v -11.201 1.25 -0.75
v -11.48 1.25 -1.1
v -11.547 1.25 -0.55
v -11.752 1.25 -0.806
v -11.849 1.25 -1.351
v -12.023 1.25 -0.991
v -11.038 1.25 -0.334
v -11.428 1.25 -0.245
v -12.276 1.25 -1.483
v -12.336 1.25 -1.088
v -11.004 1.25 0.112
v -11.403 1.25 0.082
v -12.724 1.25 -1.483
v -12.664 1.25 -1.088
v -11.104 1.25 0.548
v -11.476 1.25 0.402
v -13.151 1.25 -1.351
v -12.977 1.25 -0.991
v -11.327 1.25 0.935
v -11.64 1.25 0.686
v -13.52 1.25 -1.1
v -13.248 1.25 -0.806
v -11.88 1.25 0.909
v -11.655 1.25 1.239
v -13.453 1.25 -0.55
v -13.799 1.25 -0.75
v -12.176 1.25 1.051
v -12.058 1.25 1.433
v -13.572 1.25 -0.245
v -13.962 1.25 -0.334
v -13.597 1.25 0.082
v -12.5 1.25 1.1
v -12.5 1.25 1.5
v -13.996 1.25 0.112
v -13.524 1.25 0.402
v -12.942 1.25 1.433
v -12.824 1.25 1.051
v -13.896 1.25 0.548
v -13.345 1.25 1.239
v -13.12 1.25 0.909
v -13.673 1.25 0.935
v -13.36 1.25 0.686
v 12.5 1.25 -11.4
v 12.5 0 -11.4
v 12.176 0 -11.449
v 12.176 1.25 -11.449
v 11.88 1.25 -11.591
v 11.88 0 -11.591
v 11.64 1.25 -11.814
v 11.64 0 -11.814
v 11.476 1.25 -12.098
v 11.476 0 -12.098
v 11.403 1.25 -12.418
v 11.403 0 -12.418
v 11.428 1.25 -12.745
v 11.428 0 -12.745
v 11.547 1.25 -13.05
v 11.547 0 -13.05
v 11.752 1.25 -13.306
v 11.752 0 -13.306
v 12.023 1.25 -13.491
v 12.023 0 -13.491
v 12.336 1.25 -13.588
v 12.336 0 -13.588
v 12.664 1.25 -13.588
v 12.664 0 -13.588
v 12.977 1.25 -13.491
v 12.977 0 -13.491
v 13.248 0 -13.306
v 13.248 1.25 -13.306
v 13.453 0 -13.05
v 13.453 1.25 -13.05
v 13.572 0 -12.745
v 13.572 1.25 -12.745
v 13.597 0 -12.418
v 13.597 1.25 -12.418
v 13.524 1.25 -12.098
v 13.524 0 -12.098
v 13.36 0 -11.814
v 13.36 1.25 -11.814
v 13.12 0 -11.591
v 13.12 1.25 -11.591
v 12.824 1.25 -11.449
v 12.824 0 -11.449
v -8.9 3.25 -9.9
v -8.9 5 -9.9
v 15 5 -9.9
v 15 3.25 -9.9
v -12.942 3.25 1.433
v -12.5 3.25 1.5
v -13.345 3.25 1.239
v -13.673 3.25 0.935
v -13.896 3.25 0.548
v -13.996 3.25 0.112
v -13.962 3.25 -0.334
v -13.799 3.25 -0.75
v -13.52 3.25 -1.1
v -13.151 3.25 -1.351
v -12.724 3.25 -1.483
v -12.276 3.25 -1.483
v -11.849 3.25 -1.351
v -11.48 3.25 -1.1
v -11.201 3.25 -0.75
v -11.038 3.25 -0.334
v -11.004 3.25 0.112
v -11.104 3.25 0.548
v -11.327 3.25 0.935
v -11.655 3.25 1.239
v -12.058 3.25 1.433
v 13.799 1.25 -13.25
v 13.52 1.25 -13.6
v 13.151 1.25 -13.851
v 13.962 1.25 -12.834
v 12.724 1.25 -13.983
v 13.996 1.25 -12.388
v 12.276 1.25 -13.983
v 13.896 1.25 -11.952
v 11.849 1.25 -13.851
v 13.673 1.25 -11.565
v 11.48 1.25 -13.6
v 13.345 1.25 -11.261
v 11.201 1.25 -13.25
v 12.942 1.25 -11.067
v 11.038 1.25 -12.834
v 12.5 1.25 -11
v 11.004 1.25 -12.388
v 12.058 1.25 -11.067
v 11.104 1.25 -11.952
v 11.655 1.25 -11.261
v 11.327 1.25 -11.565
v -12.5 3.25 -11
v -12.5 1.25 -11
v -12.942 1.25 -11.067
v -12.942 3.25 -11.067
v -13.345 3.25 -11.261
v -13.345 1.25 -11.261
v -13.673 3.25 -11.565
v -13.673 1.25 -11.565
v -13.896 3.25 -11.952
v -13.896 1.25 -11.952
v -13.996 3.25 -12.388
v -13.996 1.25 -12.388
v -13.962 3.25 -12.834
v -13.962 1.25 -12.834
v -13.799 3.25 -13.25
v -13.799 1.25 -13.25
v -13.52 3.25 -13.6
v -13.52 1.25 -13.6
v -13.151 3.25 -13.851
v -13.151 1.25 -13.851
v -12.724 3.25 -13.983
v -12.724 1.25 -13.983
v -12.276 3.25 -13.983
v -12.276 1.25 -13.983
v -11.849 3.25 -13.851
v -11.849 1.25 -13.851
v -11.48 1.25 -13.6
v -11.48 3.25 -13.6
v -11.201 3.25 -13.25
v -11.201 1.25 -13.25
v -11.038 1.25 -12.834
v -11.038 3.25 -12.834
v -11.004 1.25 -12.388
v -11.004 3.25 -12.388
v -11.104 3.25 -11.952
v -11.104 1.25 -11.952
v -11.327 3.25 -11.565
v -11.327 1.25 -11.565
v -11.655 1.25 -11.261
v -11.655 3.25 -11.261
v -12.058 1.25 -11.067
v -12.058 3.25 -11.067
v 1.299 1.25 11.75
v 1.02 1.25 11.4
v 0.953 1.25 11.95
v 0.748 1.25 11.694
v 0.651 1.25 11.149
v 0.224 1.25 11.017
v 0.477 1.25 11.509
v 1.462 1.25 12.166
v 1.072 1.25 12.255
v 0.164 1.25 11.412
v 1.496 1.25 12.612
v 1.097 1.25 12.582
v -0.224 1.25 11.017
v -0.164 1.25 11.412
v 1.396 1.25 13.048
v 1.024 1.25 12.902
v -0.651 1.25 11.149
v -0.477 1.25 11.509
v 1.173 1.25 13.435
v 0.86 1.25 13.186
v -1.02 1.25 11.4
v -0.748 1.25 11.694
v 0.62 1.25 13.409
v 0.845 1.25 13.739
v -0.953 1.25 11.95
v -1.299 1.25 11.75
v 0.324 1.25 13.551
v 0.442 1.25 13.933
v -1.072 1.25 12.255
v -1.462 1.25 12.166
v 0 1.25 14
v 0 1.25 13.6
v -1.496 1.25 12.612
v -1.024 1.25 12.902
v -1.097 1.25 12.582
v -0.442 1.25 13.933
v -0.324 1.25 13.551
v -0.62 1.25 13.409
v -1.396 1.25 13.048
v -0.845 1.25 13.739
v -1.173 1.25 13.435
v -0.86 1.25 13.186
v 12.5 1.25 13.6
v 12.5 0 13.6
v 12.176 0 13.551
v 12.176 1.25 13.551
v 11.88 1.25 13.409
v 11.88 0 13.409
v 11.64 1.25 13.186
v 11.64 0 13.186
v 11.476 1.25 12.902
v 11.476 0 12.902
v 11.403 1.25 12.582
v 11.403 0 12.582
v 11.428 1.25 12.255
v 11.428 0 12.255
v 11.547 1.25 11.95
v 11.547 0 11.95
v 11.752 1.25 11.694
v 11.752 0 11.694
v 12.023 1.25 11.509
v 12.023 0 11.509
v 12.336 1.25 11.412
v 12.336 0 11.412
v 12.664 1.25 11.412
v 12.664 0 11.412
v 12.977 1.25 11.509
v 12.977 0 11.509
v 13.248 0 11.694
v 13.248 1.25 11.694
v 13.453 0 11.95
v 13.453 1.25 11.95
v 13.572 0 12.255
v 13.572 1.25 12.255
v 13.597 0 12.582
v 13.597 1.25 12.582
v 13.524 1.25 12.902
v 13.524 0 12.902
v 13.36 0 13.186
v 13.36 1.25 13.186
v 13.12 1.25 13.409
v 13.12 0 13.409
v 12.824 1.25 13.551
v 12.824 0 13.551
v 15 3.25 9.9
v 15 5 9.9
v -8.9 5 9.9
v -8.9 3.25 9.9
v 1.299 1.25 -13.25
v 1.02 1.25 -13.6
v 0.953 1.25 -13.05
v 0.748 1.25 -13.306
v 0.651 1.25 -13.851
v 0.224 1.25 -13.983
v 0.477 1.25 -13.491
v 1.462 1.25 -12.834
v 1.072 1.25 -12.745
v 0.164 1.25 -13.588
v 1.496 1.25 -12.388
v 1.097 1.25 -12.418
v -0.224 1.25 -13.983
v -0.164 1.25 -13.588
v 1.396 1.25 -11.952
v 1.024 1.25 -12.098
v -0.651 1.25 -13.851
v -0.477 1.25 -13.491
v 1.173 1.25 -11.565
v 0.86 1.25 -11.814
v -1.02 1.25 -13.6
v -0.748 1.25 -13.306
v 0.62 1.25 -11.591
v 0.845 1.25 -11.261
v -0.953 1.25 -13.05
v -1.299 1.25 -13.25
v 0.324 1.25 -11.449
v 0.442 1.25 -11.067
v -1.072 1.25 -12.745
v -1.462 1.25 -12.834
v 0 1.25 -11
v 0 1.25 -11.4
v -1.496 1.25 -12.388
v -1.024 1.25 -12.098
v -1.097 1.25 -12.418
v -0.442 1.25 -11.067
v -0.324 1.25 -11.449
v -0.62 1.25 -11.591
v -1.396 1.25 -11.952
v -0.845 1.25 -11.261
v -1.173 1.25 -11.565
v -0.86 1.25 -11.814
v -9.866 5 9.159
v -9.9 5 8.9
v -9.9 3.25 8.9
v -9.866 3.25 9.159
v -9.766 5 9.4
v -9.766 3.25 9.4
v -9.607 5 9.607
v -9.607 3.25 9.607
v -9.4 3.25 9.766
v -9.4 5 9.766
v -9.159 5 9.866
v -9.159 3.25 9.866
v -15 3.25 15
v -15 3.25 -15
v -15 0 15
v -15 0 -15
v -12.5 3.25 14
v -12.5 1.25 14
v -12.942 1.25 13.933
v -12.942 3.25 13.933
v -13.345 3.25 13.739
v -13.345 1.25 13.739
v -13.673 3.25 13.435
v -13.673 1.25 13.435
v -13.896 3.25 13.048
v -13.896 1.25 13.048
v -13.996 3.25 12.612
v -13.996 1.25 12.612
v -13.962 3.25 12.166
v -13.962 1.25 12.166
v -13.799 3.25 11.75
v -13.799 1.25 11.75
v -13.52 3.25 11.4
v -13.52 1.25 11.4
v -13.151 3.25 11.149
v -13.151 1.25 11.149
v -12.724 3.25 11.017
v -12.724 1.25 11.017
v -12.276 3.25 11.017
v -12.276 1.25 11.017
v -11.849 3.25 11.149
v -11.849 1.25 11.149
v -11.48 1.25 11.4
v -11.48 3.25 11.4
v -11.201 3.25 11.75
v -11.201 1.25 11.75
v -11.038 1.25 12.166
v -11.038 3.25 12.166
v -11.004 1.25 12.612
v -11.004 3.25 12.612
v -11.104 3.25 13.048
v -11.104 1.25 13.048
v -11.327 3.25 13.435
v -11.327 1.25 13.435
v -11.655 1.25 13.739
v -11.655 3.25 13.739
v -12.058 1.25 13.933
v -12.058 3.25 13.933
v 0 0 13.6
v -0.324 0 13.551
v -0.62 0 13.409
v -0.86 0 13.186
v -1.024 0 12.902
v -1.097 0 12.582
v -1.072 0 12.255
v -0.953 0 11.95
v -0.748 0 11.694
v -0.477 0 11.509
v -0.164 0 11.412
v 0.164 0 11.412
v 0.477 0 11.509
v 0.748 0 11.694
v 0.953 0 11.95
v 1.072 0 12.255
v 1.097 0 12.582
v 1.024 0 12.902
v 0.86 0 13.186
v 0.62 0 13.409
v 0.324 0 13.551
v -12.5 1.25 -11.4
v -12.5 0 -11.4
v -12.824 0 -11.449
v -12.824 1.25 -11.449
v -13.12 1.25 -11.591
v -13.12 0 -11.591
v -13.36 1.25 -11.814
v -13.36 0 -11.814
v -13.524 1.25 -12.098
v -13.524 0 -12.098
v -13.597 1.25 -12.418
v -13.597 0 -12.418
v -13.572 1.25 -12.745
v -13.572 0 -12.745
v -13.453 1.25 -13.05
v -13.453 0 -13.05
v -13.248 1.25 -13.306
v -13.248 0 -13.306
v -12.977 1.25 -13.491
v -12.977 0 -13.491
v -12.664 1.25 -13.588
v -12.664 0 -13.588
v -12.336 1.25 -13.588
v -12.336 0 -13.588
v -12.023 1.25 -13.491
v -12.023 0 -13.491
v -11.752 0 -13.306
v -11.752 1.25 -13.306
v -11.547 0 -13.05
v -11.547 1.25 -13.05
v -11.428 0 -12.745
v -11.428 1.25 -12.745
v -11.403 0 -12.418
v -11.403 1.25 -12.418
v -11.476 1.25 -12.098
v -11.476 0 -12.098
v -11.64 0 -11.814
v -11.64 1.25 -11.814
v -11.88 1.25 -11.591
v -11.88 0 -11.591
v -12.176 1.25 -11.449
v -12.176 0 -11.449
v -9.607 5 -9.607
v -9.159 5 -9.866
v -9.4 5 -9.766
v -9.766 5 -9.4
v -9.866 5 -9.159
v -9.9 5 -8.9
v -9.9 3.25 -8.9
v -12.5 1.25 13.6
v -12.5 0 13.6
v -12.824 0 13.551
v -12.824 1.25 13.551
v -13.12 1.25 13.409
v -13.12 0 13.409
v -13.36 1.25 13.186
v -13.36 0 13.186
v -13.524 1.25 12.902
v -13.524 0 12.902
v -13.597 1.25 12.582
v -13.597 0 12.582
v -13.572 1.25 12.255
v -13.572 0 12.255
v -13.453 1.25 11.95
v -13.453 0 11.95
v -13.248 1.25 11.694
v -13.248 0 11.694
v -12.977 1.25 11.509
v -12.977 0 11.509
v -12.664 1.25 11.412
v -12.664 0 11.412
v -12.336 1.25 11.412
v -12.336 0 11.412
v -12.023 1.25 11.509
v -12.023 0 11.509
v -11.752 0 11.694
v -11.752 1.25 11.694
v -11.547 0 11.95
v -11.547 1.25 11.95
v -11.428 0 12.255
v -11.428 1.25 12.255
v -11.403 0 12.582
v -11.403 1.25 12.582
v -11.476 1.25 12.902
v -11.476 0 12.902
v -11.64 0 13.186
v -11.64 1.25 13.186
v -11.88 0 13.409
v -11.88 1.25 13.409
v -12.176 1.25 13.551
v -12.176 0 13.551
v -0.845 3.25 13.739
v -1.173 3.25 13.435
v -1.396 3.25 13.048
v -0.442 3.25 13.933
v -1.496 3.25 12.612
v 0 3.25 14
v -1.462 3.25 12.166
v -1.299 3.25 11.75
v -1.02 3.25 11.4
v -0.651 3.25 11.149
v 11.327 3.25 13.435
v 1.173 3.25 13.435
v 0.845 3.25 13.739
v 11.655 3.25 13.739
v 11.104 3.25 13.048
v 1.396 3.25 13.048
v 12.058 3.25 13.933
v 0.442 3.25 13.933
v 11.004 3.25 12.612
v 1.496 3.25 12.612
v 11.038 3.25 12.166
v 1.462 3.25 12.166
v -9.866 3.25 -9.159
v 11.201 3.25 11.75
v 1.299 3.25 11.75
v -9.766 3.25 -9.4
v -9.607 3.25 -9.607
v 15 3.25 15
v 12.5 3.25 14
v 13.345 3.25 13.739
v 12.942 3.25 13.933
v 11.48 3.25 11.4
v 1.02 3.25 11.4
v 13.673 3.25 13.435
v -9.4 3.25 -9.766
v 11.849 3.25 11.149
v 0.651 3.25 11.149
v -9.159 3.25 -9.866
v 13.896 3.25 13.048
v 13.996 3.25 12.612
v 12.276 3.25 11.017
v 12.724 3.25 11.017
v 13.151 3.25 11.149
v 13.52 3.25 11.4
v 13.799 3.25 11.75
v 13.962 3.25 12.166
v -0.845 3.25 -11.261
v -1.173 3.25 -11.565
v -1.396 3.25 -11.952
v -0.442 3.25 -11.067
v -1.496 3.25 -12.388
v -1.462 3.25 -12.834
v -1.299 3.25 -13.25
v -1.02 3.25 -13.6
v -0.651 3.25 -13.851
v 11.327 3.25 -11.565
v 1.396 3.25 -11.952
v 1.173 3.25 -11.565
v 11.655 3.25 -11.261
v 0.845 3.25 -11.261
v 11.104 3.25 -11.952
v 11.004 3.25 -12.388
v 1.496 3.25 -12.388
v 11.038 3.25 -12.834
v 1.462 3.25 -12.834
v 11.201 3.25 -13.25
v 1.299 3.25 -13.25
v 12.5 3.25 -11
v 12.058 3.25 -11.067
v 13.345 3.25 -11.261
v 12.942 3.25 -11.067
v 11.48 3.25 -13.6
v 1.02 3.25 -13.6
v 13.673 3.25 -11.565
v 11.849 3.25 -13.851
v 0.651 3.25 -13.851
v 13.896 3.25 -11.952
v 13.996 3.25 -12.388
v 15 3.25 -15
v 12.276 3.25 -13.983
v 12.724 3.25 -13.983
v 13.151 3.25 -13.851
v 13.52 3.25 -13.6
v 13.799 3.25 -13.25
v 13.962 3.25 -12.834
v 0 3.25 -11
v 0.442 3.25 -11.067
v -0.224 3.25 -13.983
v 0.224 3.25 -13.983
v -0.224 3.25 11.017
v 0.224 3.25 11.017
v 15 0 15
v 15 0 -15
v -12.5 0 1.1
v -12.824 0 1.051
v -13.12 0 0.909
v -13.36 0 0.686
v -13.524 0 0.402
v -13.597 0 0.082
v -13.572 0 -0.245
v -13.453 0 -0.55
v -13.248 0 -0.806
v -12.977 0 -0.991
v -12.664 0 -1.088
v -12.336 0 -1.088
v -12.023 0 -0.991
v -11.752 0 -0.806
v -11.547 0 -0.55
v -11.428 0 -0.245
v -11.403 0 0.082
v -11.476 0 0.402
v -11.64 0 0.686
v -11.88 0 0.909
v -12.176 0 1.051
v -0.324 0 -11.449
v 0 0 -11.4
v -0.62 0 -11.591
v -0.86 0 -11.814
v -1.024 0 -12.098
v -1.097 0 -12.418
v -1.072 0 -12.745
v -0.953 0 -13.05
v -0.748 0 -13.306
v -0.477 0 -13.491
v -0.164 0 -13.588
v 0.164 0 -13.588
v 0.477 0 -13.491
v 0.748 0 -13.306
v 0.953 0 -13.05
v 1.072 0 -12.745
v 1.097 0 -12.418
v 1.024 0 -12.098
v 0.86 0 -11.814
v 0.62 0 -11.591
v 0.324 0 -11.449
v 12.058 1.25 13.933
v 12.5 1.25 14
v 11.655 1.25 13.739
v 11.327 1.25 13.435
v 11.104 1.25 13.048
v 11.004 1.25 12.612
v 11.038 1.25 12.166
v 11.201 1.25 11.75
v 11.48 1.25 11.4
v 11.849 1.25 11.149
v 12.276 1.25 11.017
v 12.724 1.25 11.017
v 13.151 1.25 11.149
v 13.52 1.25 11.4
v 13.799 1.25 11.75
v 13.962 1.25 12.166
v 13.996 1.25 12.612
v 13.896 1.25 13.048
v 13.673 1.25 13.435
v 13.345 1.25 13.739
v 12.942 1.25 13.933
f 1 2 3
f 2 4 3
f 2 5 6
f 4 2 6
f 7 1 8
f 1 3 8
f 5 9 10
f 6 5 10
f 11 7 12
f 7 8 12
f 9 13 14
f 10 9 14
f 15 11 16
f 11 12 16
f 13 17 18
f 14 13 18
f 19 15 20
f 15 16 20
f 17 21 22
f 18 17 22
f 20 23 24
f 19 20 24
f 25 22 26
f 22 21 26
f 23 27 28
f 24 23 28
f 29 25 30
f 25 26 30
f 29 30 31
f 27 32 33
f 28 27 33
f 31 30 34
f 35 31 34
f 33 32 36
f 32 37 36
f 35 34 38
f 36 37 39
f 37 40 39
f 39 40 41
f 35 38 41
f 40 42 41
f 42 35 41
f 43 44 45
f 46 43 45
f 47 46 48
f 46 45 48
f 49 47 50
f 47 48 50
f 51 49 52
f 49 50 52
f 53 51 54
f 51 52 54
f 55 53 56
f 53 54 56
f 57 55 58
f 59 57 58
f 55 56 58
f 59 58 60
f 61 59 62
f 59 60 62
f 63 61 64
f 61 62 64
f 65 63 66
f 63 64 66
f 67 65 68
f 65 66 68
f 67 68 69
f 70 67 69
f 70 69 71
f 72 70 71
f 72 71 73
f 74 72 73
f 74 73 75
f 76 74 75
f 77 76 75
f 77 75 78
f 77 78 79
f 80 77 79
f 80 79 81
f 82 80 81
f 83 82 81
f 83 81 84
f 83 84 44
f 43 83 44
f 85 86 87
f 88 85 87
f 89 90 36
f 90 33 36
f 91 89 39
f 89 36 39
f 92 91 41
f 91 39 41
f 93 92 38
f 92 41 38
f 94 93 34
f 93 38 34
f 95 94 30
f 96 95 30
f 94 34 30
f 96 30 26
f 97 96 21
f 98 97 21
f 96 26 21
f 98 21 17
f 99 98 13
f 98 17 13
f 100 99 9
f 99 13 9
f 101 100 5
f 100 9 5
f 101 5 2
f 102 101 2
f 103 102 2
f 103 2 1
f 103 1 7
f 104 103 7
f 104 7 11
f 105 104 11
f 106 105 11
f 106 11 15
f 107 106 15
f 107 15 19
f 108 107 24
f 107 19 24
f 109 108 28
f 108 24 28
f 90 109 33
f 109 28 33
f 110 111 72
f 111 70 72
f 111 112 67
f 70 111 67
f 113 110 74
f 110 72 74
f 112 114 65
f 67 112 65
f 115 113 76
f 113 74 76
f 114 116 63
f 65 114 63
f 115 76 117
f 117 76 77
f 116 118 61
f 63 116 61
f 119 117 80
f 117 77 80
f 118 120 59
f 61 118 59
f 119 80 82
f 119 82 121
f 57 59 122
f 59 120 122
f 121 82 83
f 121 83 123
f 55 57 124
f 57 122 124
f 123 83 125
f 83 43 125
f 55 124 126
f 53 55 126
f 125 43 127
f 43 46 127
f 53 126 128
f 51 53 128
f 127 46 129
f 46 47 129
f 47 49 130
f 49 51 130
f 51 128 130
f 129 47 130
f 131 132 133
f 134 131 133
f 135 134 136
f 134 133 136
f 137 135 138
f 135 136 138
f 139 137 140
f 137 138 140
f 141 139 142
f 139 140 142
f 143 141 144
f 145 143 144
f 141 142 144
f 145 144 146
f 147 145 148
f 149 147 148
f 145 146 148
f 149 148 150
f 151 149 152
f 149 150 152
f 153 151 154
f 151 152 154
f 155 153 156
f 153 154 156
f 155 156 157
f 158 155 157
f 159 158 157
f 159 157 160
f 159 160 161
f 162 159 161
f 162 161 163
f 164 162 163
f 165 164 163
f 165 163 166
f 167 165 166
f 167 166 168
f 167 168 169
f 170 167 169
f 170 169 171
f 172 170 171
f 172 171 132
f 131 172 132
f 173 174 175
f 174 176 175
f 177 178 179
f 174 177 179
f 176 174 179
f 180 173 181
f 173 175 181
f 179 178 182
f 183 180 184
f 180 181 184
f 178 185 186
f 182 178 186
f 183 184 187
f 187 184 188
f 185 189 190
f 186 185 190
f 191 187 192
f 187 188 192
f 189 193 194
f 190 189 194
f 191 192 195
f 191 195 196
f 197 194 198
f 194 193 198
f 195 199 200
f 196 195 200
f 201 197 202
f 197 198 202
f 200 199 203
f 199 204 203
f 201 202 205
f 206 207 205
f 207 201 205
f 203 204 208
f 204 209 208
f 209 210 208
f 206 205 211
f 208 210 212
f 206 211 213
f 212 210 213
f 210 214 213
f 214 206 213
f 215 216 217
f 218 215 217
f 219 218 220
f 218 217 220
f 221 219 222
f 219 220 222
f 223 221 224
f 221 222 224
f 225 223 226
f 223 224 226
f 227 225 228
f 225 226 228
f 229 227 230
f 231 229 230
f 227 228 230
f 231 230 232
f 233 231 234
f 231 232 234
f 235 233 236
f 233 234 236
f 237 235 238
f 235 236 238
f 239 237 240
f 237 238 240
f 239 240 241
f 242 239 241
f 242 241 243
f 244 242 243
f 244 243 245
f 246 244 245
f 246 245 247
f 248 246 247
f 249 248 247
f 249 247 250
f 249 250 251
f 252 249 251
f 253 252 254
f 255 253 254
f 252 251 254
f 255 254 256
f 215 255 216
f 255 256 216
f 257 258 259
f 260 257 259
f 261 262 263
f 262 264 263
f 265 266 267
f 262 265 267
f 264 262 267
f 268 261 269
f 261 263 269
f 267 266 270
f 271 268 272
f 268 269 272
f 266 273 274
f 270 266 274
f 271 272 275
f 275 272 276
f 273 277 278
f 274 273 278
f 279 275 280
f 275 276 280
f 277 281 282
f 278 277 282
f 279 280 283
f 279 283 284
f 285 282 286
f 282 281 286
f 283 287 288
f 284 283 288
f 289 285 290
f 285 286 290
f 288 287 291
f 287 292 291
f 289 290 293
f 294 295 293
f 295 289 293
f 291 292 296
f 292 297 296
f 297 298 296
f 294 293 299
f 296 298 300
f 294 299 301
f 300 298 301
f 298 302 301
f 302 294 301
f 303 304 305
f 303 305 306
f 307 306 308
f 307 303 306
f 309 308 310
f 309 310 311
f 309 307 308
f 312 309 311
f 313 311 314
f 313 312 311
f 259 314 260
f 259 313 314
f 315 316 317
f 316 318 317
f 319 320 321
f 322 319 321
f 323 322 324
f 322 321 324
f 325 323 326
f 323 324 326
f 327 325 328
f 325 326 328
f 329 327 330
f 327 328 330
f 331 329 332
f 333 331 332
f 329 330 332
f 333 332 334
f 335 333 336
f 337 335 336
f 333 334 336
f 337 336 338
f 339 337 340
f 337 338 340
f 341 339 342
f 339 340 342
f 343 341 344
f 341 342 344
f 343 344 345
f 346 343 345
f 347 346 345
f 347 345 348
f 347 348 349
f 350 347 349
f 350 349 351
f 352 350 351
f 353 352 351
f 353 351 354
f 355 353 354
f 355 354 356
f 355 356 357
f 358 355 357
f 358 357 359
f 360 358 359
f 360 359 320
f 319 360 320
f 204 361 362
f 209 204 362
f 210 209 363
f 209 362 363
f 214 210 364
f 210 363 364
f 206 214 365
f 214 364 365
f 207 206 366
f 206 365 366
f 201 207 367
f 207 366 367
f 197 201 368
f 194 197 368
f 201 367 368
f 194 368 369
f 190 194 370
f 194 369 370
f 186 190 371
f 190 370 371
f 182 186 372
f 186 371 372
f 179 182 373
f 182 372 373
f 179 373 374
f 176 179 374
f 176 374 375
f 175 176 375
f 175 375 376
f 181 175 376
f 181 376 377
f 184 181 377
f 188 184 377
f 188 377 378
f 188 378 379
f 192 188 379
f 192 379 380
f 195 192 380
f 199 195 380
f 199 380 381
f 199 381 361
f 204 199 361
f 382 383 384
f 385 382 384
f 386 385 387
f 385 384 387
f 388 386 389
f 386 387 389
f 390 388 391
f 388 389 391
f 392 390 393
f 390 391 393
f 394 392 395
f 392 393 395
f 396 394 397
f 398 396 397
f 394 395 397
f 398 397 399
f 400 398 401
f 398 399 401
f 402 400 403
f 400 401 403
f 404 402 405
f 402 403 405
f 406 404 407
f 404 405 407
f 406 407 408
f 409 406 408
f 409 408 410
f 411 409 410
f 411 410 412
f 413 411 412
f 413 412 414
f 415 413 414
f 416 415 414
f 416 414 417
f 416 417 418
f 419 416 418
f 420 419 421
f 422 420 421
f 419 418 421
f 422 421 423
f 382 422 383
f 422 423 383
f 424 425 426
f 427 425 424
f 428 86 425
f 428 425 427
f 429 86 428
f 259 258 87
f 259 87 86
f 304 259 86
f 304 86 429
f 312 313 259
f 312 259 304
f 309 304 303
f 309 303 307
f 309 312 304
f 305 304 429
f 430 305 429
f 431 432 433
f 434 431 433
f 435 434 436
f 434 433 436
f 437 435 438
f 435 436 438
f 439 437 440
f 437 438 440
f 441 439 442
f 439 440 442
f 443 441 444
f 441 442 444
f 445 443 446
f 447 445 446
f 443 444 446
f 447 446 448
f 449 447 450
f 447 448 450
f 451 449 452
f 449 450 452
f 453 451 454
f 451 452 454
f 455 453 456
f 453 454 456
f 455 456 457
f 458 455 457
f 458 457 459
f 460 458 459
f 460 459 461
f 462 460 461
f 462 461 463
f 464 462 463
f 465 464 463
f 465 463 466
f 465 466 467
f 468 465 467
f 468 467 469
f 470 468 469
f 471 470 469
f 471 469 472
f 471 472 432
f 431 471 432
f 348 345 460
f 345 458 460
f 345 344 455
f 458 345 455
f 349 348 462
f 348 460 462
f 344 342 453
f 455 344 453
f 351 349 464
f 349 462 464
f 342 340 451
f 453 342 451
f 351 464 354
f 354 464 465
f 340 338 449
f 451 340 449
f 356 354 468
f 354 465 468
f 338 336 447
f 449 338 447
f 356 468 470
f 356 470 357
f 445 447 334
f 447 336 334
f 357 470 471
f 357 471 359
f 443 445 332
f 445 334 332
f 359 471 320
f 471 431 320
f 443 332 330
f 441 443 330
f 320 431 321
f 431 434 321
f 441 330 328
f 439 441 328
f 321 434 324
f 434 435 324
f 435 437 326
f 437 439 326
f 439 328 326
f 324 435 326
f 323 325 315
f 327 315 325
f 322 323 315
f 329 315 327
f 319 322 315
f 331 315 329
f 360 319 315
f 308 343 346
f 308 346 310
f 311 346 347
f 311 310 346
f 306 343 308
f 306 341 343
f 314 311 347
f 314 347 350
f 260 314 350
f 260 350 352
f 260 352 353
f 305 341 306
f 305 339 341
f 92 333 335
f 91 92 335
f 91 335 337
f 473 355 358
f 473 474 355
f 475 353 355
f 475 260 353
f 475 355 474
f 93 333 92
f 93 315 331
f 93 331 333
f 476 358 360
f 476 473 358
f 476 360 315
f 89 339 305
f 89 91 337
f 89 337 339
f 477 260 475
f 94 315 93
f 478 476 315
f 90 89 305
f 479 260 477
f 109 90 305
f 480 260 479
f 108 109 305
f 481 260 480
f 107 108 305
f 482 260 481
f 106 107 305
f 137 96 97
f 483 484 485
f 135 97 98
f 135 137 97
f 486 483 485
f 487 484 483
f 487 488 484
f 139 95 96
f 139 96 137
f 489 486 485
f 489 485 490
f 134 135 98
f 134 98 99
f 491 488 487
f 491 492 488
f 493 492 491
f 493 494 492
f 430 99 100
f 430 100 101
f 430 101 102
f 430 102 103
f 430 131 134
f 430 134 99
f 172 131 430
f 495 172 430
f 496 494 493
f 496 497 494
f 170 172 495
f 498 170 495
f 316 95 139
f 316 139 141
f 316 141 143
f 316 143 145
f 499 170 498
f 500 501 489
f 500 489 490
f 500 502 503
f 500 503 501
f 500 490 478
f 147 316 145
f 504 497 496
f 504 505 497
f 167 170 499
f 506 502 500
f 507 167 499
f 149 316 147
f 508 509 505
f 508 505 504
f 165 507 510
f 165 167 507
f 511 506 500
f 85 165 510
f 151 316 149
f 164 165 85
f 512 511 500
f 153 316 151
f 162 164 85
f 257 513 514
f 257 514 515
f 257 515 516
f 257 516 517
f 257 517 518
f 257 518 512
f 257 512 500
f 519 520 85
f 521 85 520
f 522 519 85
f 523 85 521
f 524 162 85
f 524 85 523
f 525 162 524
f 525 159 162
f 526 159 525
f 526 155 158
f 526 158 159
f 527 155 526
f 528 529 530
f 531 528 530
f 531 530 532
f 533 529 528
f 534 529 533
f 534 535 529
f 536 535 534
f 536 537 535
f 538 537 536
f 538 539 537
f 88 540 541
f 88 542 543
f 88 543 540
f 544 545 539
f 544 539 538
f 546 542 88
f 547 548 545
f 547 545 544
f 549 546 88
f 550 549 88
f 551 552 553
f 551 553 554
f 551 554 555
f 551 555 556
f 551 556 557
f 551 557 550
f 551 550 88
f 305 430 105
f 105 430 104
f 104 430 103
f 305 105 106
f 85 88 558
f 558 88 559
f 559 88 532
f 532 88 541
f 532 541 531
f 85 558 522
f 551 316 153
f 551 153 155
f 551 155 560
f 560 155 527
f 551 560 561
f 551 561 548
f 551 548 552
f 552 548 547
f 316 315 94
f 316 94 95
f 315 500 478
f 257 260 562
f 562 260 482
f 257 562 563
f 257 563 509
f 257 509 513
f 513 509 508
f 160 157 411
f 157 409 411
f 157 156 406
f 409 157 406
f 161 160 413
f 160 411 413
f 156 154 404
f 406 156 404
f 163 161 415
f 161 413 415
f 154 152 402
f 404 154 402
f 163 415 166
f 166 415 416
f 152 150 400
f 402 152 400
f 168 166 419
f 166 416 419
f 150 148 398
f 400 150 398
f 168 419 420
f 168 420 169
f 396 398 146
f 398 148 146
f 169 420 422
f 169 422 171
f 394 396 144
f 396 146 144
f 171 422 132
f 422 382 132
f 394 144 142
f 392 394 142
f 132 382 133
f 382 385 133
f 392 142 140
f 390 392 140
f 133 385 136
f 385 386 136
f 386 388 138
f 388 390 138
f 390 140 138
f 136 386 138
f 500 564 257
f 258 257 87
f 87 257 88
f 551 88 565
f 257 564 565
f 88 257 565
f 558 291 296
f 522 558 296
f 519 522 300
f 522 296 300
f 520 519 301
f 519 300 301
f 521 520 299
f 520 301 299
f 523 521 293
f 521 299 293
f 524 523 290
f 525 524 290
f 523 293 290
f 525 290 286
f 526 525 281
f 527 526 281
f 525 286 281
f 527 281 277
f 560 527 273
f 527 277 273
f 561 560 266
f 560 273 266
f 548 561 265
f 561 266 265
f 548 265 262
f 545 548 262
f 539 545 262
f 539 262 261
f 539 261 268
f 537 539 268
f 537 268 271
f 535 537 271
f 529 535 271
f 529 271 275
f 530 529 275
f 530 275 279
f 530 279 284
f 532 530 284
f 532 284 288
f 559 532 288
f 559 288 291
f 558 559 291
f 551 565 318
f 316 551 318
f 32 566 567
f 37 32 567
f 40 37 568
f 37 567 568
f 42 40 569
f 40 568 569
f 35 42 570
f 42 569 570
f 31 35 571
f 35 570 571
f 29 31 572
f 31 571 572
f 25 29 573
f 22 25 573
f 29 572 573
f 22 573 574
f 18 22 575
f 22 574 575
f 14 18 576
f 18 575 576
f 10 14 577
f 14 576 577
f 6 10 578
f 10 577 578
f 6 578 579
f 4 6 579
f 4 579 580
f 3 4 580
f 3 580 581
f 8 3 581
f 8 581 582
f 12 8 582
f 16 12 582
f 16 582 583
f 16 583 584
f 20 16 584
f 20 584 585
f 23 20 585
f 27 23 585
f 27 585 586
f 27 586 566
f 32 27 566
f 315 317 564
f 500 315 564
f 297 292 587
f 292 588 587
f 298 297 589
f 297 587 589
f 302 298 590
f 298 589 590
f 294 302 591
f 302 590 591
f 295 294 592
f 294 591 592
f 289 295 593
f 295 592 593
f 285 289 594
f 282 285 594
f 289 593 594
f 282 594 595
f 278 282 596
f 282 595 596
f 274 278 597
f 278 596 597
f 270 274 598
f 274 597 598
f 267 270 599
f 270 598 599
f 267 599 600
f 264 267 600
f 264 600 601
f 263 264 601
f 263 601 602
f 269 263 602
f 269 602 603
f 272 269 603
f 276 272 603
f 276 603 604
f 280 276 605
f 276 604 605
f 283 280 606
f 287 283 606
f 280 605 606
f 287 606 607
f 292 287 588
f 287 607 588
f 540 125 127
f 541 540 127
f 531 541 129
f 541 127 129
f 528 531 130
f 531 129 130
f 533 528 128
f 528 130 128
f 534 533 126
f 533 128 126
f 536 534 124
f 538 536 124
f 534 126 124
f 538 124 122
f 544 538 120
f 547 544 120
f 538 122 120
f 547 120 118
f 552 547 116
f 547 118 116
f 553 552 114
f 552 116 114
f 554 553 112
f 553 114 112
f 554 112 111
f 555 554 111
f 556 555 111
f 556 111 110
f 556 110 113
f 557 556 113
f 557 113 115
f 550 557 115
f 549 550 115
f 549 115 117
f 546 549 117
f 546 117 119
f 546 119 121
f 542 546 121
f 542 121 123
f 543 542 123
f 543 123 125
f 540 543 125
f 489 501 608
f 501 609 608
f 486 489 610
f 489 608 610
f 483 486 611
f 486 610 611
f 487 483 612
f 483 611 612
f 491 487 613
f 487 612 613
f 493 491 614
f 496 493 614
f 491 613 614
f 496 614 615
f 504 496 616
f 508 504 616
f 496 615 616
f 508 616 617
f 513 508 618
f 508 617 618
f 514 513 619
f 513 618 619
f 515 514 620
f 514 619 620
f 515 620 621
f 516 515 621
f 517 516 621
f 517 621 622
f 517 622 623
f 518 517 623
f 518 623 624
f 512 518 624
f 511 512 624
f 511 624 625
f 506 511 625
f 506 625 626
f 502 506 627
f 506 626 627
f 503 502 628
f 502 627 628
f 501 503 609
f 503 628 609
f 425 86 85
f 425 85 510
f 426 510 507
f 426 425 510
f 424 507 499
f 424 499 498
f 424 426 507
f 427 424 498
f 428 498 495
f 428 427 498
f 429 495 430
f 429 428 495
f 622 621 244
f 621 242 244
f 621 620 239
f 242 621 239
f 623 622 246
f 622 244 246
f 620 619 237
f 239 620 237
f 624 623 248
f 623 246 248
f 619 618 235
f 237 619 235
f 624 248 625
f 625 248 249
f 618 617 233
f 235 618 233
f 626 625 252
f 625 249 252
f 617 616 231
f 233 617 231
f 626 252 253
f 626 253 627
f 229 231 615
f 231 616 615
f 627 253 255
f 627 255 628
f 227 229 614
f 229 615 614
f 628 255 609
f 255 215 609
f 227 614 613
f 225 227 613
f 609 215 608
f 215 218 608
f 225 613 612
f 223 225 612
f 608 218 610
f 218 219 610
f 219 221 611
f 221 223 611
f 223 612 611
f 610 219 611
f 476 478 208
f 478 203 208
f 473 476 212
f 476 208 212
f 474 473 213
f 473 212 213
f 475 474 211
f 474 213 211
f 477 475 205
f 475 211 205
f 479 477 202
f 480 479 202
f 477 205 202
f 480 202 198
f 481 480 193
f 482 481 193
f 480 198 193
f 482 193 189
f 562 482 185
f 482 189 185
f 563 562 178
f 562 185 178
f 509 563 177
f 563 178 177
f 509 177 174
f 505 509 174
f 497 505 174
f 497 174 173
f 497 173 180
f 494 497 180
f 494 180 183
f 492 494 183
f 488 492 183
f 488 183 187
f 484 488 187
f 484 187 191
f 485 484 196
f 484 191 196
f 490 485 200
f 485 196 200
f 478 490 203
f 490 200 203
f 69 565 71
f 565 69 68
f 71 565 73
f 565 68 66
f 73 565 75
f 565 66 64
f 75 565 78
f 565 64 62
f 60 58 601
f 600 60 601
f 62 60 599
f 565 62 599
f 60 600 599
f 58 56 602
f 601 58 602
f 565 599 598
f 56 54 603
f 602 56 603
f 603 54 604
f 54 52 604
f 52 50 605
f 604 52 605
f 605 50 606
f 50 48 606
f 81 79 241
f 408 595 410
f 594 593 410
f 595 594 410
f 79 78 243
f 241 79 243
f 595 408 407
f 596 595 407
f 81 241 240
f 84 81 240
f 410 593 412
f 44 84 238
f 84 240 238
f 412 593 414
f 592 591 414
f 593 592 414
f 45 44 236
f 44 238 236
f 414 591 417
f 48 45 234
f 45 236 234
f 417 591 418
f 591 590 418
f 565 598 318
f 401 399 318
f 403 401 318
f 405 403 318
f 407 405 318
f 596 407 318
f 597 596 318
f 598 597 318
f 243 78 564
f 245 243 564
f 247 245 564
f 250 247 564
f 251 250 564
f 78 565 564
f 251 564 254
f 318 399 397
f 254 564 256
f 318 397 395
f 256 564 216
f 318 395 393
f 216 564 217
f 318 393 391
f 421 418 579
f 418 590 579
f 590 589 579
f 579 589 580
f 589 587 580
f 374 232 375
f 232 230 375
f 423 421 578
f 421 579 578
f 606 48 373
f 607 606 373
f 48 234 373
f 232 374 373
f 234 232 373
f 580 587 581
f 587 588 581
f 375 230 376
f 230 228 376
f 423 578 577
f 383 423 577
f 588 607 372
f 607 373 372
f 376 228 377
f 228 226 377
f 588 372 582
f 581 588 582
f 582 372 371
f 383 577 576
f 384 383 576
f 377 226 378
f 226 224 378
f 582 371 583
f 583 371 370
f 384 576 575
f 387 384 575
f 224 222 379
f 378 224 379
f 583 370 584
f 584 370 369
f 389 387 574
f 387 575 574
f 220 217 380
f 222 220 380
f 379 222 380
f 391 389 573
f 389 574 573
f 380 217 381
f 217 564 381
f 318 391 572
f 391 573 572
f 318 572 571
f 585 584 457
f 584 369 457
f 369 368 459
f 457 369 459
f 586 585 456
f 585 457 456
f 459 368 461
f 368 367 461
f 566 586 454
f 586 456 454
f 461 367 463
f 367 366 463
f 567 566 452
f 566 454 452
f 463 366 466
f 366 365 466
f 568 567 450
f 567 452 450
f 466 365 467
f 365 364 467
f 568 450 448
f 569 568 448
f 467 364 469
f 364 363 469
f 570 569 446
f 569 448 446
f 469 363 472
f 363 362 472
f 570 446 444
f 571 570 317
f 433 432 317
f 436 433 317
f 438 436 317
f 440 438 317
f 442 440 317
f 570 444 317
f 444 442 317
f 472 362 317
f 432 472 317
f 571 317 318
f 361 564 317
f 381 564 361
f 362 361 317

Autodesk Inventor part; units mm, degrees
ref_plane "YZ Plane" through (0, 0, 0) normal (1, 0, 0) x (0, 1, 0)
ref_plane "XZ Plane" through (0, 0, 0) normal (0, 1, 0) x (-1, 0, 0)
ref_plane "XY Plane" through (0, 0, 0) normal (0, 0, 1) x (1, 0, 0)
sketch "Sketch1" plane through (0, 0, 0) normal (0, 1, 0) x (-1, 0, 0)
  line L0 (-15, -15) -> (15, -15)
  line L1 (15, -15) -> (15, 15)
  line L2 (15, 15) -> (-15, 15)
  line L3 (-15, 15) -> (-15, -15)
  line L4 (-15, -15) -> (15, 15) construction
  line L5 (15, -15) -> (-15, 15) construction
  point P0 (0, 0)
  dimension "d0" = 30
  dimension "d1" = 30
extrude "Extrusion1" add sketch "Sketch1" along normal blind 5
sketch "Sketch2" plane through (0, 5, 0) normal (0, 1, 0) x (1, 0, 0)
  line L0 (-15, -15) -> (15, -15) projected
  line L1 (-15, 15) -> (-15, -15) projected
  line L2 (15, 15) -> (-15, 15) projected
  line L3 (15, -15) -> (15, 15) projected
  line L4 (-15, -15) -> (15, -15)
  line L5 (15, -15) -> (15, -9.9)
  line L6 (15, -9.9) -> (-8.9, -9.9)
  line L7 (-15, -9.9) -> (-15, -15)
  line L8 (-15, -15) -> (-9.9, -15)
  line L9 (-9.9, -8.9) -> (-9.9, 8.9)
  line L10 (-9.9, 15) -> (-15, 15)
  line L11 (-15, 15) -> (-15, -15)
  line L12 (15, 15) -> (-9.9, 15)
  line L13 (-9.9, 15) -> (-9.9, 9.9)
  line L14 (-8.9, 9.9) -> (15, 9.9)
  line L15 (15, 9.9) -> (15, 15)
  arc A0 (-9.9, -8.9) -> (-8.9, -9.9) centre (-8.9, -8.9) ccw
  arc A1 (-8.9, 9.9) -> (-9.9, 8.9) centre (-8.9, 8.9) ccw
  point P0 (0, 0)
  dimension "d4" = 5.1
  dimension "d5" = 5.1
  dimension "d6" = 5.1
  dimension "d7" = 1
extrude "Extrusion2" cut sketch "Sketch2" against normal blind 1.75 contours L1 L2 L3 L14 A1 L9 A0 L6 L0
sketch "Sketch3" plane through (0, 3.25, 0) normal (0, 1, 0) x (1, 0, 0)
  line L0 (-9.9, 8.9) -> (-9.9, -8.9) projected
  line L1 (15, -15) -> (-15, -15) projected
  line L2 (-15, 15) -> (15, 15) projected
  point P0 (0, 0)
  point P1 (-12.5, -12.5)
  point P2 (12.5, -12.5)
  point P3 (-12.5, 12.5)
  point P4 (12.5, 12.5)
  point P5 (-9.9, 0)
  point P6 (0, -15)
  point P7 (0, -12.5)
  point P8 (-12.5, 0)
  point P9 (0, 12.5)
  point P10 (-9.9, 0)
  point P11 (0, -15)
  point P12 (0, 15)
  dimension "d10" = 25
  dimension "d11" = 25
  dimension "d12" = 12.5
  dimension "d13" = 12.5
hole "Hole1" at (-12.5, 3.25, 12.5) at (12.5, 3.25, 12.5) at (-12.5, 3.25, -12.5) at (12.5, 3.25, -12.5) at (0, 3.25, 12.5) at (0, 3.25, -12.5) at (-12.5, 3.25, 0) direction (0, -1, 0) diameter 3 depth 2
hole "Hole2" at (-12.5, 3.25, 0) at (-12.5, 3.25, 12.5) at (0, 3.25, 12.5) at (12.5, 3.25, 12.5) at (12.5, 3.25, -12.5) at (0, 3.25, -12.5) at (-12.5, 3.25, -12.5) direction (0, -1, 0) diameter 2.2 end through all
equation "\"d5\" = d4"
equation "\"d6\" = d4"
equation "\"d12\" = 0.5 * d11"
equation "\"d13\" = 0.5 * d10"
properties part number "Flex Circuit Clamp Base V1"
